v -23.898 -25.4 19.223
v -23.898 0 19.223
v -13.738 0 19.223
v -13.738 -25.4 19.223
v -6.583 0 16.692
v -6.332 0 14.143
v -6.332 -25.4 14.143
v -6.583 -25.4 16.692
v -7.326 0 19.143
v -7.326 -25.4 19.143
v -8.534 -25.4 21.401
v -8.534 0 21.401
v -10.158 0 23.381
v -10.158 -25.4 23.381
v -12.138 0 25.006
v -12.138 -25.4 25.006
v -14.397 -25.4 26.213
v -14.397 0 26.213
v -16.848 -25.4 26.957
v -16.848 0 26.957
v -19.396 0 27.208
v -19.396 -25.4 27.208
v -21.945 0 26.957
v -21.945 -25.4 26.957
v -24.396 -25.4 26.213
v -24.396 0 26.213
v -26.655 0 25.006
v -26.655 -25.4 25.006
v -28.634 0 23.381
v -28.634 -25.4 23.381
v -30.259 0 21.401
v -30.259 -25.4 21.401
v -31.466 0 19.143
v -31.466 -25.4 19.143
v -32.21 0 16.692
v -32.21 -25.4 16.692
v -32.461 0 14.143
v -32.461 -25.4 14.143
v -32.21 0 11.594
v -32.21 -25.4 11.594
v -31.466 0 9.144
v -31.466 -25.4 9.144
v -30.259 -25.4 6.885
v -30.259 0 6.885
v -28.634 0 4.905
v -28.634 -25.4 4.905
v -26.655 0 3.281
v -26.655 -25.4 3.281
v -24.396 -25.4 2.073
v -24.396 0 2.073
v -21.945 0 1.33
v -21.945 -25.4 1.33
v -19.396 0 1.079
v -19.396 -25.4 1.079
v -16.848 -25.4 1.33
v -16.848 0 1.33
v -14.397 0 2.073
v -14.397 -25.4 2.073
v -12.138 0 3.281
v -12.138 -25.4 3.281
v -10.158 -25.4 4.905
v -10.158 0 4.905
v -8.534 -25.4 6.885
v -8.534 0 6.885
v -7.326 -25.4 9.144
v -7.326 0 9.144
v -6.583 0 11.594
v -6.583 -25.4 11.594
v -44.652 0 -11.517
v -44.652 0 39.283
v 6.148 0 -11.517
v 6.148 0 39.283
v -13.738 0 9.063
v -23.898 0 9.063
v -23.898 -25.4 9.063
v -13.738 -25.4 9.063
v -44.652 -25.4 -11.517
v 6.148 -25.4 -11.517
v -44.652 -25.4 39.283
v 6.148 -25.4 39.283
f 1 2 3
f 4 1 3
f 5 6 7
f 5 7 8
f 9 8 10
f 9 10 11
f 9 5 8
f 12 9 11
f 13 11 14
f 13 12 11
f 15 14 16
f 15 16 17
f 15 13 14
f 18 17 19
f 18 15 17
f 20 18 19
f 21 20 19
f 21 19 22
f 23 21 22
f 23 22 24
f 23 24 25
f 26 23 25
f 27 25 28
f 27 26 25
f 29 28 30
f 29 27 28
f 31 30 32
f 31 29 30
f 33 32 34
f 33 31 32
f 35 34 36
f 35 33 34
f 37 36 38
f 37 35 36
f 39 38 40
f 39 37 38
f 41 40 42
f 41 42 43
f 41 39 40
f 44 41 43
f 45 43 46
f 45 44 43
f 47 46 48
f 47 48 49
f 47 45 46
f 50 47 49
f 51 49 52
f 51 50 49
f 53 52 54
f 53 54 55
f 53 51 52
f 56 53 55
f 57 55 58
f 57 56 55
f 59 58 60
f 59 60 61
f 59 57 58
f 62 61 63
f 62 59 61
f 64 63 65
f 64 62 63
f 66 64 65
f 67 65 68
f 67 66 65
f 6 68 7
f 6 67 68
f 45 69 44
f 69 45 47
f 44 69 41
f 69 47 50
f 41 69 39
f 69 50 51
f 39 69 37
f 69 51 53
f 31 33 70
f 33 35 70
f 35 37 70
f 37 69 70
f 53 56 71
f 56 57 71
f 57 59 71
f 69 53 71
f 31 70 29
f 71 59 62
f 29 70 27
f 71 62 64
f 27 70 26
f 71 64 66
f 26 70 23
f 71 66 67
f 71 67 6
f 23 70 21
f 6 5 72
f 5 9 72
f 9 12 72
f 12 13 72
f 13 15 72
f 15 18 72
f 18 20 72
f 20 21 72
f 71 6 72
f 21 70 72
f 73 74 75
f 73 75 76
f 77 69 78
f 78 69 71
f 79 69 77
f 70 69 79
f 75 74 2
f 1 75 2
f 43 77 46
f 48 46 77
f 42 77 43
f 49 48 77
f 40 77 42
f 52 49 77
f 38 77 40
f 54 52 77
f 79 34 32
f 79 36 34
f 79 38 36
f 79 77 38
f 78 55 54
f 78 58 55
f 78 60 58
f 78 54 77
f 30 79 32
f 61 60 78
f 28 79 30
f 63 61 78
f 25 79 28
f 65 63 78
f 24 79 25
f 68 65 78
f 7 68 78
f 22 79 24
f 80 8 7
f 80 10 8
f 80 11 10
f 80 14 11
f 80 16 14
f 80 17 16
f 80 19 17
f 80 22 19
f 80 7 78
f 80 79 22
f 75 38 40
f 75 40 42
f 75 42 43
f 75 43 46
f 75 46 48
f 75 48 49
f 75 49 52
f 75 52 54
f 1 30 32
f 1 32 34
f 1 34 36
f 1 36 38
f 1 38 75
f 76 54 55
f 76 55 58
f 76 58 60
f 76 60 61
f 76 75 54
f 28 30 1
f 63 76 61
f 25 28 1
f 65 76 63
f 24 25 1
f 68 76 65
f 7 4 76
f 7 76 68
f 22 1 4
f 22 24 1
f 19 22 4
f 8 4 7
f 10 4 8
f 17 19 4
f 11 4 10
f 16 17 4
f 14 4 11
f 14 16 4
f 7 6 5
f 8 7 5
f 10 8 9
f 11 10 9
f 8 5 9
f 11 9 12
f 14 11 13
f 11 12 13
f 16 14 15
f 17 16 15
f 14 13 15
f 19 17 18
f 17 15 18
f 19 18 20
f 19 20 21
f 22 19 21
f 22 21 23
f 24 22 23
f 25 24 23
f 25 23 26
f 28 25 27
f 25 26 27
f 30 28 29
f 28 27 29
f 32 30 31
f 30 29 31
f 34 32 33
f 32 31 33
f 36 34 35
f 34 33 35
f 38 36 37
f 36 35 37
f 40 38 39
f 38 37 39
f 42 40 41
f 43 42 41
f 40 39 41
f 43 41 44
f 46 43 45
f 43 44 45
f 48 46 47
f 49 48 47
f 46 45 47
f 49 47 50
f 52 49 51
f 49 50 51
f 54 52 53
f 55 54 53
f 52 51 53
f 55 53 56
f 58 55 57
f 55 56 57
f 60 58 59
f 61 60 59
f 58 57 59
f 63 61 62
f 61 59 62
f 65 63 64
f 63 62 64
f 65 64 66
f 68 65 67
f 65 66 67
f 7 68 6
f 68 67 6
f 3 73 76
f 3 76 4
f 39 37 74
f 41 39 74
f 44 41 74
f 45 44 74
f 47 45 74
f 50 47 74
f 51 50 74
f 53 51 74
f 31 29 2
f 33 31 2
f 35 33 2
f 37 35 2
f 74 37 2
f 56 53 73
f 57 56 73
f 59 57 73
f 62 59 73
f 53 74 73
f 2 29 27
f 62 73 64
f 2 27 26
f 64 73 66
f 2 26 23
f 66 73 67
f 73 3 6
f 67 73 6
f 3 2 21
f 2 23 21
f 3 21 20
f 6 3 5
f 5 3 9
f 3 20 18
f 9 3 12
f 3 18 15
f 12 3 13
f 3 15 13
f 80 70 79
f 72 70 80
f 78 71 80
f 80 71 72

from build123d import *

# Parameters (mm, degrees)
F0_W     = 50.8
F0_H     = 50.8
F0_R     = 13.064391
F1_DEPTH = 25.4
F2_DEPTH = 25.4
F3_W     = 10.16
F3_H     = 10.16
F4_DEPTH = 25.4


with BuildPart() as f1:
    # F0 (on Front) → F1 (new body)
    with BuildSketch(Plane.XZ):
        with Locations((-19.252045, 13.883409)):
            Rectangle(F0_W, F0_H)
        with Locations((-19.396363, 14.143182)):
            Circle(F0_R, mode=Mode.SUBTRACT)
    extrude(amount=F1_DEPTH)


with BuildPart() as f2:
    # F0 (on Front) → F2 (new body)
    with BuildSketch(Plane.XZ):
        with Locations((-19.396363, 14.143182)):
            Circle(F0_R)
    extrude(amount=F2_DEPTH)

    # F3 (on face) → F4 (cut)
    with BuildSketch(Plane.XZ):
        with Locations((-18.818023, 14.143182)):
            Rectangle(F3_W, F3_H)
    extrude(amount=F4_DEPTH, mode=Mode.SUBTRACT)


solid = Compound([f1.part, f2.part])
